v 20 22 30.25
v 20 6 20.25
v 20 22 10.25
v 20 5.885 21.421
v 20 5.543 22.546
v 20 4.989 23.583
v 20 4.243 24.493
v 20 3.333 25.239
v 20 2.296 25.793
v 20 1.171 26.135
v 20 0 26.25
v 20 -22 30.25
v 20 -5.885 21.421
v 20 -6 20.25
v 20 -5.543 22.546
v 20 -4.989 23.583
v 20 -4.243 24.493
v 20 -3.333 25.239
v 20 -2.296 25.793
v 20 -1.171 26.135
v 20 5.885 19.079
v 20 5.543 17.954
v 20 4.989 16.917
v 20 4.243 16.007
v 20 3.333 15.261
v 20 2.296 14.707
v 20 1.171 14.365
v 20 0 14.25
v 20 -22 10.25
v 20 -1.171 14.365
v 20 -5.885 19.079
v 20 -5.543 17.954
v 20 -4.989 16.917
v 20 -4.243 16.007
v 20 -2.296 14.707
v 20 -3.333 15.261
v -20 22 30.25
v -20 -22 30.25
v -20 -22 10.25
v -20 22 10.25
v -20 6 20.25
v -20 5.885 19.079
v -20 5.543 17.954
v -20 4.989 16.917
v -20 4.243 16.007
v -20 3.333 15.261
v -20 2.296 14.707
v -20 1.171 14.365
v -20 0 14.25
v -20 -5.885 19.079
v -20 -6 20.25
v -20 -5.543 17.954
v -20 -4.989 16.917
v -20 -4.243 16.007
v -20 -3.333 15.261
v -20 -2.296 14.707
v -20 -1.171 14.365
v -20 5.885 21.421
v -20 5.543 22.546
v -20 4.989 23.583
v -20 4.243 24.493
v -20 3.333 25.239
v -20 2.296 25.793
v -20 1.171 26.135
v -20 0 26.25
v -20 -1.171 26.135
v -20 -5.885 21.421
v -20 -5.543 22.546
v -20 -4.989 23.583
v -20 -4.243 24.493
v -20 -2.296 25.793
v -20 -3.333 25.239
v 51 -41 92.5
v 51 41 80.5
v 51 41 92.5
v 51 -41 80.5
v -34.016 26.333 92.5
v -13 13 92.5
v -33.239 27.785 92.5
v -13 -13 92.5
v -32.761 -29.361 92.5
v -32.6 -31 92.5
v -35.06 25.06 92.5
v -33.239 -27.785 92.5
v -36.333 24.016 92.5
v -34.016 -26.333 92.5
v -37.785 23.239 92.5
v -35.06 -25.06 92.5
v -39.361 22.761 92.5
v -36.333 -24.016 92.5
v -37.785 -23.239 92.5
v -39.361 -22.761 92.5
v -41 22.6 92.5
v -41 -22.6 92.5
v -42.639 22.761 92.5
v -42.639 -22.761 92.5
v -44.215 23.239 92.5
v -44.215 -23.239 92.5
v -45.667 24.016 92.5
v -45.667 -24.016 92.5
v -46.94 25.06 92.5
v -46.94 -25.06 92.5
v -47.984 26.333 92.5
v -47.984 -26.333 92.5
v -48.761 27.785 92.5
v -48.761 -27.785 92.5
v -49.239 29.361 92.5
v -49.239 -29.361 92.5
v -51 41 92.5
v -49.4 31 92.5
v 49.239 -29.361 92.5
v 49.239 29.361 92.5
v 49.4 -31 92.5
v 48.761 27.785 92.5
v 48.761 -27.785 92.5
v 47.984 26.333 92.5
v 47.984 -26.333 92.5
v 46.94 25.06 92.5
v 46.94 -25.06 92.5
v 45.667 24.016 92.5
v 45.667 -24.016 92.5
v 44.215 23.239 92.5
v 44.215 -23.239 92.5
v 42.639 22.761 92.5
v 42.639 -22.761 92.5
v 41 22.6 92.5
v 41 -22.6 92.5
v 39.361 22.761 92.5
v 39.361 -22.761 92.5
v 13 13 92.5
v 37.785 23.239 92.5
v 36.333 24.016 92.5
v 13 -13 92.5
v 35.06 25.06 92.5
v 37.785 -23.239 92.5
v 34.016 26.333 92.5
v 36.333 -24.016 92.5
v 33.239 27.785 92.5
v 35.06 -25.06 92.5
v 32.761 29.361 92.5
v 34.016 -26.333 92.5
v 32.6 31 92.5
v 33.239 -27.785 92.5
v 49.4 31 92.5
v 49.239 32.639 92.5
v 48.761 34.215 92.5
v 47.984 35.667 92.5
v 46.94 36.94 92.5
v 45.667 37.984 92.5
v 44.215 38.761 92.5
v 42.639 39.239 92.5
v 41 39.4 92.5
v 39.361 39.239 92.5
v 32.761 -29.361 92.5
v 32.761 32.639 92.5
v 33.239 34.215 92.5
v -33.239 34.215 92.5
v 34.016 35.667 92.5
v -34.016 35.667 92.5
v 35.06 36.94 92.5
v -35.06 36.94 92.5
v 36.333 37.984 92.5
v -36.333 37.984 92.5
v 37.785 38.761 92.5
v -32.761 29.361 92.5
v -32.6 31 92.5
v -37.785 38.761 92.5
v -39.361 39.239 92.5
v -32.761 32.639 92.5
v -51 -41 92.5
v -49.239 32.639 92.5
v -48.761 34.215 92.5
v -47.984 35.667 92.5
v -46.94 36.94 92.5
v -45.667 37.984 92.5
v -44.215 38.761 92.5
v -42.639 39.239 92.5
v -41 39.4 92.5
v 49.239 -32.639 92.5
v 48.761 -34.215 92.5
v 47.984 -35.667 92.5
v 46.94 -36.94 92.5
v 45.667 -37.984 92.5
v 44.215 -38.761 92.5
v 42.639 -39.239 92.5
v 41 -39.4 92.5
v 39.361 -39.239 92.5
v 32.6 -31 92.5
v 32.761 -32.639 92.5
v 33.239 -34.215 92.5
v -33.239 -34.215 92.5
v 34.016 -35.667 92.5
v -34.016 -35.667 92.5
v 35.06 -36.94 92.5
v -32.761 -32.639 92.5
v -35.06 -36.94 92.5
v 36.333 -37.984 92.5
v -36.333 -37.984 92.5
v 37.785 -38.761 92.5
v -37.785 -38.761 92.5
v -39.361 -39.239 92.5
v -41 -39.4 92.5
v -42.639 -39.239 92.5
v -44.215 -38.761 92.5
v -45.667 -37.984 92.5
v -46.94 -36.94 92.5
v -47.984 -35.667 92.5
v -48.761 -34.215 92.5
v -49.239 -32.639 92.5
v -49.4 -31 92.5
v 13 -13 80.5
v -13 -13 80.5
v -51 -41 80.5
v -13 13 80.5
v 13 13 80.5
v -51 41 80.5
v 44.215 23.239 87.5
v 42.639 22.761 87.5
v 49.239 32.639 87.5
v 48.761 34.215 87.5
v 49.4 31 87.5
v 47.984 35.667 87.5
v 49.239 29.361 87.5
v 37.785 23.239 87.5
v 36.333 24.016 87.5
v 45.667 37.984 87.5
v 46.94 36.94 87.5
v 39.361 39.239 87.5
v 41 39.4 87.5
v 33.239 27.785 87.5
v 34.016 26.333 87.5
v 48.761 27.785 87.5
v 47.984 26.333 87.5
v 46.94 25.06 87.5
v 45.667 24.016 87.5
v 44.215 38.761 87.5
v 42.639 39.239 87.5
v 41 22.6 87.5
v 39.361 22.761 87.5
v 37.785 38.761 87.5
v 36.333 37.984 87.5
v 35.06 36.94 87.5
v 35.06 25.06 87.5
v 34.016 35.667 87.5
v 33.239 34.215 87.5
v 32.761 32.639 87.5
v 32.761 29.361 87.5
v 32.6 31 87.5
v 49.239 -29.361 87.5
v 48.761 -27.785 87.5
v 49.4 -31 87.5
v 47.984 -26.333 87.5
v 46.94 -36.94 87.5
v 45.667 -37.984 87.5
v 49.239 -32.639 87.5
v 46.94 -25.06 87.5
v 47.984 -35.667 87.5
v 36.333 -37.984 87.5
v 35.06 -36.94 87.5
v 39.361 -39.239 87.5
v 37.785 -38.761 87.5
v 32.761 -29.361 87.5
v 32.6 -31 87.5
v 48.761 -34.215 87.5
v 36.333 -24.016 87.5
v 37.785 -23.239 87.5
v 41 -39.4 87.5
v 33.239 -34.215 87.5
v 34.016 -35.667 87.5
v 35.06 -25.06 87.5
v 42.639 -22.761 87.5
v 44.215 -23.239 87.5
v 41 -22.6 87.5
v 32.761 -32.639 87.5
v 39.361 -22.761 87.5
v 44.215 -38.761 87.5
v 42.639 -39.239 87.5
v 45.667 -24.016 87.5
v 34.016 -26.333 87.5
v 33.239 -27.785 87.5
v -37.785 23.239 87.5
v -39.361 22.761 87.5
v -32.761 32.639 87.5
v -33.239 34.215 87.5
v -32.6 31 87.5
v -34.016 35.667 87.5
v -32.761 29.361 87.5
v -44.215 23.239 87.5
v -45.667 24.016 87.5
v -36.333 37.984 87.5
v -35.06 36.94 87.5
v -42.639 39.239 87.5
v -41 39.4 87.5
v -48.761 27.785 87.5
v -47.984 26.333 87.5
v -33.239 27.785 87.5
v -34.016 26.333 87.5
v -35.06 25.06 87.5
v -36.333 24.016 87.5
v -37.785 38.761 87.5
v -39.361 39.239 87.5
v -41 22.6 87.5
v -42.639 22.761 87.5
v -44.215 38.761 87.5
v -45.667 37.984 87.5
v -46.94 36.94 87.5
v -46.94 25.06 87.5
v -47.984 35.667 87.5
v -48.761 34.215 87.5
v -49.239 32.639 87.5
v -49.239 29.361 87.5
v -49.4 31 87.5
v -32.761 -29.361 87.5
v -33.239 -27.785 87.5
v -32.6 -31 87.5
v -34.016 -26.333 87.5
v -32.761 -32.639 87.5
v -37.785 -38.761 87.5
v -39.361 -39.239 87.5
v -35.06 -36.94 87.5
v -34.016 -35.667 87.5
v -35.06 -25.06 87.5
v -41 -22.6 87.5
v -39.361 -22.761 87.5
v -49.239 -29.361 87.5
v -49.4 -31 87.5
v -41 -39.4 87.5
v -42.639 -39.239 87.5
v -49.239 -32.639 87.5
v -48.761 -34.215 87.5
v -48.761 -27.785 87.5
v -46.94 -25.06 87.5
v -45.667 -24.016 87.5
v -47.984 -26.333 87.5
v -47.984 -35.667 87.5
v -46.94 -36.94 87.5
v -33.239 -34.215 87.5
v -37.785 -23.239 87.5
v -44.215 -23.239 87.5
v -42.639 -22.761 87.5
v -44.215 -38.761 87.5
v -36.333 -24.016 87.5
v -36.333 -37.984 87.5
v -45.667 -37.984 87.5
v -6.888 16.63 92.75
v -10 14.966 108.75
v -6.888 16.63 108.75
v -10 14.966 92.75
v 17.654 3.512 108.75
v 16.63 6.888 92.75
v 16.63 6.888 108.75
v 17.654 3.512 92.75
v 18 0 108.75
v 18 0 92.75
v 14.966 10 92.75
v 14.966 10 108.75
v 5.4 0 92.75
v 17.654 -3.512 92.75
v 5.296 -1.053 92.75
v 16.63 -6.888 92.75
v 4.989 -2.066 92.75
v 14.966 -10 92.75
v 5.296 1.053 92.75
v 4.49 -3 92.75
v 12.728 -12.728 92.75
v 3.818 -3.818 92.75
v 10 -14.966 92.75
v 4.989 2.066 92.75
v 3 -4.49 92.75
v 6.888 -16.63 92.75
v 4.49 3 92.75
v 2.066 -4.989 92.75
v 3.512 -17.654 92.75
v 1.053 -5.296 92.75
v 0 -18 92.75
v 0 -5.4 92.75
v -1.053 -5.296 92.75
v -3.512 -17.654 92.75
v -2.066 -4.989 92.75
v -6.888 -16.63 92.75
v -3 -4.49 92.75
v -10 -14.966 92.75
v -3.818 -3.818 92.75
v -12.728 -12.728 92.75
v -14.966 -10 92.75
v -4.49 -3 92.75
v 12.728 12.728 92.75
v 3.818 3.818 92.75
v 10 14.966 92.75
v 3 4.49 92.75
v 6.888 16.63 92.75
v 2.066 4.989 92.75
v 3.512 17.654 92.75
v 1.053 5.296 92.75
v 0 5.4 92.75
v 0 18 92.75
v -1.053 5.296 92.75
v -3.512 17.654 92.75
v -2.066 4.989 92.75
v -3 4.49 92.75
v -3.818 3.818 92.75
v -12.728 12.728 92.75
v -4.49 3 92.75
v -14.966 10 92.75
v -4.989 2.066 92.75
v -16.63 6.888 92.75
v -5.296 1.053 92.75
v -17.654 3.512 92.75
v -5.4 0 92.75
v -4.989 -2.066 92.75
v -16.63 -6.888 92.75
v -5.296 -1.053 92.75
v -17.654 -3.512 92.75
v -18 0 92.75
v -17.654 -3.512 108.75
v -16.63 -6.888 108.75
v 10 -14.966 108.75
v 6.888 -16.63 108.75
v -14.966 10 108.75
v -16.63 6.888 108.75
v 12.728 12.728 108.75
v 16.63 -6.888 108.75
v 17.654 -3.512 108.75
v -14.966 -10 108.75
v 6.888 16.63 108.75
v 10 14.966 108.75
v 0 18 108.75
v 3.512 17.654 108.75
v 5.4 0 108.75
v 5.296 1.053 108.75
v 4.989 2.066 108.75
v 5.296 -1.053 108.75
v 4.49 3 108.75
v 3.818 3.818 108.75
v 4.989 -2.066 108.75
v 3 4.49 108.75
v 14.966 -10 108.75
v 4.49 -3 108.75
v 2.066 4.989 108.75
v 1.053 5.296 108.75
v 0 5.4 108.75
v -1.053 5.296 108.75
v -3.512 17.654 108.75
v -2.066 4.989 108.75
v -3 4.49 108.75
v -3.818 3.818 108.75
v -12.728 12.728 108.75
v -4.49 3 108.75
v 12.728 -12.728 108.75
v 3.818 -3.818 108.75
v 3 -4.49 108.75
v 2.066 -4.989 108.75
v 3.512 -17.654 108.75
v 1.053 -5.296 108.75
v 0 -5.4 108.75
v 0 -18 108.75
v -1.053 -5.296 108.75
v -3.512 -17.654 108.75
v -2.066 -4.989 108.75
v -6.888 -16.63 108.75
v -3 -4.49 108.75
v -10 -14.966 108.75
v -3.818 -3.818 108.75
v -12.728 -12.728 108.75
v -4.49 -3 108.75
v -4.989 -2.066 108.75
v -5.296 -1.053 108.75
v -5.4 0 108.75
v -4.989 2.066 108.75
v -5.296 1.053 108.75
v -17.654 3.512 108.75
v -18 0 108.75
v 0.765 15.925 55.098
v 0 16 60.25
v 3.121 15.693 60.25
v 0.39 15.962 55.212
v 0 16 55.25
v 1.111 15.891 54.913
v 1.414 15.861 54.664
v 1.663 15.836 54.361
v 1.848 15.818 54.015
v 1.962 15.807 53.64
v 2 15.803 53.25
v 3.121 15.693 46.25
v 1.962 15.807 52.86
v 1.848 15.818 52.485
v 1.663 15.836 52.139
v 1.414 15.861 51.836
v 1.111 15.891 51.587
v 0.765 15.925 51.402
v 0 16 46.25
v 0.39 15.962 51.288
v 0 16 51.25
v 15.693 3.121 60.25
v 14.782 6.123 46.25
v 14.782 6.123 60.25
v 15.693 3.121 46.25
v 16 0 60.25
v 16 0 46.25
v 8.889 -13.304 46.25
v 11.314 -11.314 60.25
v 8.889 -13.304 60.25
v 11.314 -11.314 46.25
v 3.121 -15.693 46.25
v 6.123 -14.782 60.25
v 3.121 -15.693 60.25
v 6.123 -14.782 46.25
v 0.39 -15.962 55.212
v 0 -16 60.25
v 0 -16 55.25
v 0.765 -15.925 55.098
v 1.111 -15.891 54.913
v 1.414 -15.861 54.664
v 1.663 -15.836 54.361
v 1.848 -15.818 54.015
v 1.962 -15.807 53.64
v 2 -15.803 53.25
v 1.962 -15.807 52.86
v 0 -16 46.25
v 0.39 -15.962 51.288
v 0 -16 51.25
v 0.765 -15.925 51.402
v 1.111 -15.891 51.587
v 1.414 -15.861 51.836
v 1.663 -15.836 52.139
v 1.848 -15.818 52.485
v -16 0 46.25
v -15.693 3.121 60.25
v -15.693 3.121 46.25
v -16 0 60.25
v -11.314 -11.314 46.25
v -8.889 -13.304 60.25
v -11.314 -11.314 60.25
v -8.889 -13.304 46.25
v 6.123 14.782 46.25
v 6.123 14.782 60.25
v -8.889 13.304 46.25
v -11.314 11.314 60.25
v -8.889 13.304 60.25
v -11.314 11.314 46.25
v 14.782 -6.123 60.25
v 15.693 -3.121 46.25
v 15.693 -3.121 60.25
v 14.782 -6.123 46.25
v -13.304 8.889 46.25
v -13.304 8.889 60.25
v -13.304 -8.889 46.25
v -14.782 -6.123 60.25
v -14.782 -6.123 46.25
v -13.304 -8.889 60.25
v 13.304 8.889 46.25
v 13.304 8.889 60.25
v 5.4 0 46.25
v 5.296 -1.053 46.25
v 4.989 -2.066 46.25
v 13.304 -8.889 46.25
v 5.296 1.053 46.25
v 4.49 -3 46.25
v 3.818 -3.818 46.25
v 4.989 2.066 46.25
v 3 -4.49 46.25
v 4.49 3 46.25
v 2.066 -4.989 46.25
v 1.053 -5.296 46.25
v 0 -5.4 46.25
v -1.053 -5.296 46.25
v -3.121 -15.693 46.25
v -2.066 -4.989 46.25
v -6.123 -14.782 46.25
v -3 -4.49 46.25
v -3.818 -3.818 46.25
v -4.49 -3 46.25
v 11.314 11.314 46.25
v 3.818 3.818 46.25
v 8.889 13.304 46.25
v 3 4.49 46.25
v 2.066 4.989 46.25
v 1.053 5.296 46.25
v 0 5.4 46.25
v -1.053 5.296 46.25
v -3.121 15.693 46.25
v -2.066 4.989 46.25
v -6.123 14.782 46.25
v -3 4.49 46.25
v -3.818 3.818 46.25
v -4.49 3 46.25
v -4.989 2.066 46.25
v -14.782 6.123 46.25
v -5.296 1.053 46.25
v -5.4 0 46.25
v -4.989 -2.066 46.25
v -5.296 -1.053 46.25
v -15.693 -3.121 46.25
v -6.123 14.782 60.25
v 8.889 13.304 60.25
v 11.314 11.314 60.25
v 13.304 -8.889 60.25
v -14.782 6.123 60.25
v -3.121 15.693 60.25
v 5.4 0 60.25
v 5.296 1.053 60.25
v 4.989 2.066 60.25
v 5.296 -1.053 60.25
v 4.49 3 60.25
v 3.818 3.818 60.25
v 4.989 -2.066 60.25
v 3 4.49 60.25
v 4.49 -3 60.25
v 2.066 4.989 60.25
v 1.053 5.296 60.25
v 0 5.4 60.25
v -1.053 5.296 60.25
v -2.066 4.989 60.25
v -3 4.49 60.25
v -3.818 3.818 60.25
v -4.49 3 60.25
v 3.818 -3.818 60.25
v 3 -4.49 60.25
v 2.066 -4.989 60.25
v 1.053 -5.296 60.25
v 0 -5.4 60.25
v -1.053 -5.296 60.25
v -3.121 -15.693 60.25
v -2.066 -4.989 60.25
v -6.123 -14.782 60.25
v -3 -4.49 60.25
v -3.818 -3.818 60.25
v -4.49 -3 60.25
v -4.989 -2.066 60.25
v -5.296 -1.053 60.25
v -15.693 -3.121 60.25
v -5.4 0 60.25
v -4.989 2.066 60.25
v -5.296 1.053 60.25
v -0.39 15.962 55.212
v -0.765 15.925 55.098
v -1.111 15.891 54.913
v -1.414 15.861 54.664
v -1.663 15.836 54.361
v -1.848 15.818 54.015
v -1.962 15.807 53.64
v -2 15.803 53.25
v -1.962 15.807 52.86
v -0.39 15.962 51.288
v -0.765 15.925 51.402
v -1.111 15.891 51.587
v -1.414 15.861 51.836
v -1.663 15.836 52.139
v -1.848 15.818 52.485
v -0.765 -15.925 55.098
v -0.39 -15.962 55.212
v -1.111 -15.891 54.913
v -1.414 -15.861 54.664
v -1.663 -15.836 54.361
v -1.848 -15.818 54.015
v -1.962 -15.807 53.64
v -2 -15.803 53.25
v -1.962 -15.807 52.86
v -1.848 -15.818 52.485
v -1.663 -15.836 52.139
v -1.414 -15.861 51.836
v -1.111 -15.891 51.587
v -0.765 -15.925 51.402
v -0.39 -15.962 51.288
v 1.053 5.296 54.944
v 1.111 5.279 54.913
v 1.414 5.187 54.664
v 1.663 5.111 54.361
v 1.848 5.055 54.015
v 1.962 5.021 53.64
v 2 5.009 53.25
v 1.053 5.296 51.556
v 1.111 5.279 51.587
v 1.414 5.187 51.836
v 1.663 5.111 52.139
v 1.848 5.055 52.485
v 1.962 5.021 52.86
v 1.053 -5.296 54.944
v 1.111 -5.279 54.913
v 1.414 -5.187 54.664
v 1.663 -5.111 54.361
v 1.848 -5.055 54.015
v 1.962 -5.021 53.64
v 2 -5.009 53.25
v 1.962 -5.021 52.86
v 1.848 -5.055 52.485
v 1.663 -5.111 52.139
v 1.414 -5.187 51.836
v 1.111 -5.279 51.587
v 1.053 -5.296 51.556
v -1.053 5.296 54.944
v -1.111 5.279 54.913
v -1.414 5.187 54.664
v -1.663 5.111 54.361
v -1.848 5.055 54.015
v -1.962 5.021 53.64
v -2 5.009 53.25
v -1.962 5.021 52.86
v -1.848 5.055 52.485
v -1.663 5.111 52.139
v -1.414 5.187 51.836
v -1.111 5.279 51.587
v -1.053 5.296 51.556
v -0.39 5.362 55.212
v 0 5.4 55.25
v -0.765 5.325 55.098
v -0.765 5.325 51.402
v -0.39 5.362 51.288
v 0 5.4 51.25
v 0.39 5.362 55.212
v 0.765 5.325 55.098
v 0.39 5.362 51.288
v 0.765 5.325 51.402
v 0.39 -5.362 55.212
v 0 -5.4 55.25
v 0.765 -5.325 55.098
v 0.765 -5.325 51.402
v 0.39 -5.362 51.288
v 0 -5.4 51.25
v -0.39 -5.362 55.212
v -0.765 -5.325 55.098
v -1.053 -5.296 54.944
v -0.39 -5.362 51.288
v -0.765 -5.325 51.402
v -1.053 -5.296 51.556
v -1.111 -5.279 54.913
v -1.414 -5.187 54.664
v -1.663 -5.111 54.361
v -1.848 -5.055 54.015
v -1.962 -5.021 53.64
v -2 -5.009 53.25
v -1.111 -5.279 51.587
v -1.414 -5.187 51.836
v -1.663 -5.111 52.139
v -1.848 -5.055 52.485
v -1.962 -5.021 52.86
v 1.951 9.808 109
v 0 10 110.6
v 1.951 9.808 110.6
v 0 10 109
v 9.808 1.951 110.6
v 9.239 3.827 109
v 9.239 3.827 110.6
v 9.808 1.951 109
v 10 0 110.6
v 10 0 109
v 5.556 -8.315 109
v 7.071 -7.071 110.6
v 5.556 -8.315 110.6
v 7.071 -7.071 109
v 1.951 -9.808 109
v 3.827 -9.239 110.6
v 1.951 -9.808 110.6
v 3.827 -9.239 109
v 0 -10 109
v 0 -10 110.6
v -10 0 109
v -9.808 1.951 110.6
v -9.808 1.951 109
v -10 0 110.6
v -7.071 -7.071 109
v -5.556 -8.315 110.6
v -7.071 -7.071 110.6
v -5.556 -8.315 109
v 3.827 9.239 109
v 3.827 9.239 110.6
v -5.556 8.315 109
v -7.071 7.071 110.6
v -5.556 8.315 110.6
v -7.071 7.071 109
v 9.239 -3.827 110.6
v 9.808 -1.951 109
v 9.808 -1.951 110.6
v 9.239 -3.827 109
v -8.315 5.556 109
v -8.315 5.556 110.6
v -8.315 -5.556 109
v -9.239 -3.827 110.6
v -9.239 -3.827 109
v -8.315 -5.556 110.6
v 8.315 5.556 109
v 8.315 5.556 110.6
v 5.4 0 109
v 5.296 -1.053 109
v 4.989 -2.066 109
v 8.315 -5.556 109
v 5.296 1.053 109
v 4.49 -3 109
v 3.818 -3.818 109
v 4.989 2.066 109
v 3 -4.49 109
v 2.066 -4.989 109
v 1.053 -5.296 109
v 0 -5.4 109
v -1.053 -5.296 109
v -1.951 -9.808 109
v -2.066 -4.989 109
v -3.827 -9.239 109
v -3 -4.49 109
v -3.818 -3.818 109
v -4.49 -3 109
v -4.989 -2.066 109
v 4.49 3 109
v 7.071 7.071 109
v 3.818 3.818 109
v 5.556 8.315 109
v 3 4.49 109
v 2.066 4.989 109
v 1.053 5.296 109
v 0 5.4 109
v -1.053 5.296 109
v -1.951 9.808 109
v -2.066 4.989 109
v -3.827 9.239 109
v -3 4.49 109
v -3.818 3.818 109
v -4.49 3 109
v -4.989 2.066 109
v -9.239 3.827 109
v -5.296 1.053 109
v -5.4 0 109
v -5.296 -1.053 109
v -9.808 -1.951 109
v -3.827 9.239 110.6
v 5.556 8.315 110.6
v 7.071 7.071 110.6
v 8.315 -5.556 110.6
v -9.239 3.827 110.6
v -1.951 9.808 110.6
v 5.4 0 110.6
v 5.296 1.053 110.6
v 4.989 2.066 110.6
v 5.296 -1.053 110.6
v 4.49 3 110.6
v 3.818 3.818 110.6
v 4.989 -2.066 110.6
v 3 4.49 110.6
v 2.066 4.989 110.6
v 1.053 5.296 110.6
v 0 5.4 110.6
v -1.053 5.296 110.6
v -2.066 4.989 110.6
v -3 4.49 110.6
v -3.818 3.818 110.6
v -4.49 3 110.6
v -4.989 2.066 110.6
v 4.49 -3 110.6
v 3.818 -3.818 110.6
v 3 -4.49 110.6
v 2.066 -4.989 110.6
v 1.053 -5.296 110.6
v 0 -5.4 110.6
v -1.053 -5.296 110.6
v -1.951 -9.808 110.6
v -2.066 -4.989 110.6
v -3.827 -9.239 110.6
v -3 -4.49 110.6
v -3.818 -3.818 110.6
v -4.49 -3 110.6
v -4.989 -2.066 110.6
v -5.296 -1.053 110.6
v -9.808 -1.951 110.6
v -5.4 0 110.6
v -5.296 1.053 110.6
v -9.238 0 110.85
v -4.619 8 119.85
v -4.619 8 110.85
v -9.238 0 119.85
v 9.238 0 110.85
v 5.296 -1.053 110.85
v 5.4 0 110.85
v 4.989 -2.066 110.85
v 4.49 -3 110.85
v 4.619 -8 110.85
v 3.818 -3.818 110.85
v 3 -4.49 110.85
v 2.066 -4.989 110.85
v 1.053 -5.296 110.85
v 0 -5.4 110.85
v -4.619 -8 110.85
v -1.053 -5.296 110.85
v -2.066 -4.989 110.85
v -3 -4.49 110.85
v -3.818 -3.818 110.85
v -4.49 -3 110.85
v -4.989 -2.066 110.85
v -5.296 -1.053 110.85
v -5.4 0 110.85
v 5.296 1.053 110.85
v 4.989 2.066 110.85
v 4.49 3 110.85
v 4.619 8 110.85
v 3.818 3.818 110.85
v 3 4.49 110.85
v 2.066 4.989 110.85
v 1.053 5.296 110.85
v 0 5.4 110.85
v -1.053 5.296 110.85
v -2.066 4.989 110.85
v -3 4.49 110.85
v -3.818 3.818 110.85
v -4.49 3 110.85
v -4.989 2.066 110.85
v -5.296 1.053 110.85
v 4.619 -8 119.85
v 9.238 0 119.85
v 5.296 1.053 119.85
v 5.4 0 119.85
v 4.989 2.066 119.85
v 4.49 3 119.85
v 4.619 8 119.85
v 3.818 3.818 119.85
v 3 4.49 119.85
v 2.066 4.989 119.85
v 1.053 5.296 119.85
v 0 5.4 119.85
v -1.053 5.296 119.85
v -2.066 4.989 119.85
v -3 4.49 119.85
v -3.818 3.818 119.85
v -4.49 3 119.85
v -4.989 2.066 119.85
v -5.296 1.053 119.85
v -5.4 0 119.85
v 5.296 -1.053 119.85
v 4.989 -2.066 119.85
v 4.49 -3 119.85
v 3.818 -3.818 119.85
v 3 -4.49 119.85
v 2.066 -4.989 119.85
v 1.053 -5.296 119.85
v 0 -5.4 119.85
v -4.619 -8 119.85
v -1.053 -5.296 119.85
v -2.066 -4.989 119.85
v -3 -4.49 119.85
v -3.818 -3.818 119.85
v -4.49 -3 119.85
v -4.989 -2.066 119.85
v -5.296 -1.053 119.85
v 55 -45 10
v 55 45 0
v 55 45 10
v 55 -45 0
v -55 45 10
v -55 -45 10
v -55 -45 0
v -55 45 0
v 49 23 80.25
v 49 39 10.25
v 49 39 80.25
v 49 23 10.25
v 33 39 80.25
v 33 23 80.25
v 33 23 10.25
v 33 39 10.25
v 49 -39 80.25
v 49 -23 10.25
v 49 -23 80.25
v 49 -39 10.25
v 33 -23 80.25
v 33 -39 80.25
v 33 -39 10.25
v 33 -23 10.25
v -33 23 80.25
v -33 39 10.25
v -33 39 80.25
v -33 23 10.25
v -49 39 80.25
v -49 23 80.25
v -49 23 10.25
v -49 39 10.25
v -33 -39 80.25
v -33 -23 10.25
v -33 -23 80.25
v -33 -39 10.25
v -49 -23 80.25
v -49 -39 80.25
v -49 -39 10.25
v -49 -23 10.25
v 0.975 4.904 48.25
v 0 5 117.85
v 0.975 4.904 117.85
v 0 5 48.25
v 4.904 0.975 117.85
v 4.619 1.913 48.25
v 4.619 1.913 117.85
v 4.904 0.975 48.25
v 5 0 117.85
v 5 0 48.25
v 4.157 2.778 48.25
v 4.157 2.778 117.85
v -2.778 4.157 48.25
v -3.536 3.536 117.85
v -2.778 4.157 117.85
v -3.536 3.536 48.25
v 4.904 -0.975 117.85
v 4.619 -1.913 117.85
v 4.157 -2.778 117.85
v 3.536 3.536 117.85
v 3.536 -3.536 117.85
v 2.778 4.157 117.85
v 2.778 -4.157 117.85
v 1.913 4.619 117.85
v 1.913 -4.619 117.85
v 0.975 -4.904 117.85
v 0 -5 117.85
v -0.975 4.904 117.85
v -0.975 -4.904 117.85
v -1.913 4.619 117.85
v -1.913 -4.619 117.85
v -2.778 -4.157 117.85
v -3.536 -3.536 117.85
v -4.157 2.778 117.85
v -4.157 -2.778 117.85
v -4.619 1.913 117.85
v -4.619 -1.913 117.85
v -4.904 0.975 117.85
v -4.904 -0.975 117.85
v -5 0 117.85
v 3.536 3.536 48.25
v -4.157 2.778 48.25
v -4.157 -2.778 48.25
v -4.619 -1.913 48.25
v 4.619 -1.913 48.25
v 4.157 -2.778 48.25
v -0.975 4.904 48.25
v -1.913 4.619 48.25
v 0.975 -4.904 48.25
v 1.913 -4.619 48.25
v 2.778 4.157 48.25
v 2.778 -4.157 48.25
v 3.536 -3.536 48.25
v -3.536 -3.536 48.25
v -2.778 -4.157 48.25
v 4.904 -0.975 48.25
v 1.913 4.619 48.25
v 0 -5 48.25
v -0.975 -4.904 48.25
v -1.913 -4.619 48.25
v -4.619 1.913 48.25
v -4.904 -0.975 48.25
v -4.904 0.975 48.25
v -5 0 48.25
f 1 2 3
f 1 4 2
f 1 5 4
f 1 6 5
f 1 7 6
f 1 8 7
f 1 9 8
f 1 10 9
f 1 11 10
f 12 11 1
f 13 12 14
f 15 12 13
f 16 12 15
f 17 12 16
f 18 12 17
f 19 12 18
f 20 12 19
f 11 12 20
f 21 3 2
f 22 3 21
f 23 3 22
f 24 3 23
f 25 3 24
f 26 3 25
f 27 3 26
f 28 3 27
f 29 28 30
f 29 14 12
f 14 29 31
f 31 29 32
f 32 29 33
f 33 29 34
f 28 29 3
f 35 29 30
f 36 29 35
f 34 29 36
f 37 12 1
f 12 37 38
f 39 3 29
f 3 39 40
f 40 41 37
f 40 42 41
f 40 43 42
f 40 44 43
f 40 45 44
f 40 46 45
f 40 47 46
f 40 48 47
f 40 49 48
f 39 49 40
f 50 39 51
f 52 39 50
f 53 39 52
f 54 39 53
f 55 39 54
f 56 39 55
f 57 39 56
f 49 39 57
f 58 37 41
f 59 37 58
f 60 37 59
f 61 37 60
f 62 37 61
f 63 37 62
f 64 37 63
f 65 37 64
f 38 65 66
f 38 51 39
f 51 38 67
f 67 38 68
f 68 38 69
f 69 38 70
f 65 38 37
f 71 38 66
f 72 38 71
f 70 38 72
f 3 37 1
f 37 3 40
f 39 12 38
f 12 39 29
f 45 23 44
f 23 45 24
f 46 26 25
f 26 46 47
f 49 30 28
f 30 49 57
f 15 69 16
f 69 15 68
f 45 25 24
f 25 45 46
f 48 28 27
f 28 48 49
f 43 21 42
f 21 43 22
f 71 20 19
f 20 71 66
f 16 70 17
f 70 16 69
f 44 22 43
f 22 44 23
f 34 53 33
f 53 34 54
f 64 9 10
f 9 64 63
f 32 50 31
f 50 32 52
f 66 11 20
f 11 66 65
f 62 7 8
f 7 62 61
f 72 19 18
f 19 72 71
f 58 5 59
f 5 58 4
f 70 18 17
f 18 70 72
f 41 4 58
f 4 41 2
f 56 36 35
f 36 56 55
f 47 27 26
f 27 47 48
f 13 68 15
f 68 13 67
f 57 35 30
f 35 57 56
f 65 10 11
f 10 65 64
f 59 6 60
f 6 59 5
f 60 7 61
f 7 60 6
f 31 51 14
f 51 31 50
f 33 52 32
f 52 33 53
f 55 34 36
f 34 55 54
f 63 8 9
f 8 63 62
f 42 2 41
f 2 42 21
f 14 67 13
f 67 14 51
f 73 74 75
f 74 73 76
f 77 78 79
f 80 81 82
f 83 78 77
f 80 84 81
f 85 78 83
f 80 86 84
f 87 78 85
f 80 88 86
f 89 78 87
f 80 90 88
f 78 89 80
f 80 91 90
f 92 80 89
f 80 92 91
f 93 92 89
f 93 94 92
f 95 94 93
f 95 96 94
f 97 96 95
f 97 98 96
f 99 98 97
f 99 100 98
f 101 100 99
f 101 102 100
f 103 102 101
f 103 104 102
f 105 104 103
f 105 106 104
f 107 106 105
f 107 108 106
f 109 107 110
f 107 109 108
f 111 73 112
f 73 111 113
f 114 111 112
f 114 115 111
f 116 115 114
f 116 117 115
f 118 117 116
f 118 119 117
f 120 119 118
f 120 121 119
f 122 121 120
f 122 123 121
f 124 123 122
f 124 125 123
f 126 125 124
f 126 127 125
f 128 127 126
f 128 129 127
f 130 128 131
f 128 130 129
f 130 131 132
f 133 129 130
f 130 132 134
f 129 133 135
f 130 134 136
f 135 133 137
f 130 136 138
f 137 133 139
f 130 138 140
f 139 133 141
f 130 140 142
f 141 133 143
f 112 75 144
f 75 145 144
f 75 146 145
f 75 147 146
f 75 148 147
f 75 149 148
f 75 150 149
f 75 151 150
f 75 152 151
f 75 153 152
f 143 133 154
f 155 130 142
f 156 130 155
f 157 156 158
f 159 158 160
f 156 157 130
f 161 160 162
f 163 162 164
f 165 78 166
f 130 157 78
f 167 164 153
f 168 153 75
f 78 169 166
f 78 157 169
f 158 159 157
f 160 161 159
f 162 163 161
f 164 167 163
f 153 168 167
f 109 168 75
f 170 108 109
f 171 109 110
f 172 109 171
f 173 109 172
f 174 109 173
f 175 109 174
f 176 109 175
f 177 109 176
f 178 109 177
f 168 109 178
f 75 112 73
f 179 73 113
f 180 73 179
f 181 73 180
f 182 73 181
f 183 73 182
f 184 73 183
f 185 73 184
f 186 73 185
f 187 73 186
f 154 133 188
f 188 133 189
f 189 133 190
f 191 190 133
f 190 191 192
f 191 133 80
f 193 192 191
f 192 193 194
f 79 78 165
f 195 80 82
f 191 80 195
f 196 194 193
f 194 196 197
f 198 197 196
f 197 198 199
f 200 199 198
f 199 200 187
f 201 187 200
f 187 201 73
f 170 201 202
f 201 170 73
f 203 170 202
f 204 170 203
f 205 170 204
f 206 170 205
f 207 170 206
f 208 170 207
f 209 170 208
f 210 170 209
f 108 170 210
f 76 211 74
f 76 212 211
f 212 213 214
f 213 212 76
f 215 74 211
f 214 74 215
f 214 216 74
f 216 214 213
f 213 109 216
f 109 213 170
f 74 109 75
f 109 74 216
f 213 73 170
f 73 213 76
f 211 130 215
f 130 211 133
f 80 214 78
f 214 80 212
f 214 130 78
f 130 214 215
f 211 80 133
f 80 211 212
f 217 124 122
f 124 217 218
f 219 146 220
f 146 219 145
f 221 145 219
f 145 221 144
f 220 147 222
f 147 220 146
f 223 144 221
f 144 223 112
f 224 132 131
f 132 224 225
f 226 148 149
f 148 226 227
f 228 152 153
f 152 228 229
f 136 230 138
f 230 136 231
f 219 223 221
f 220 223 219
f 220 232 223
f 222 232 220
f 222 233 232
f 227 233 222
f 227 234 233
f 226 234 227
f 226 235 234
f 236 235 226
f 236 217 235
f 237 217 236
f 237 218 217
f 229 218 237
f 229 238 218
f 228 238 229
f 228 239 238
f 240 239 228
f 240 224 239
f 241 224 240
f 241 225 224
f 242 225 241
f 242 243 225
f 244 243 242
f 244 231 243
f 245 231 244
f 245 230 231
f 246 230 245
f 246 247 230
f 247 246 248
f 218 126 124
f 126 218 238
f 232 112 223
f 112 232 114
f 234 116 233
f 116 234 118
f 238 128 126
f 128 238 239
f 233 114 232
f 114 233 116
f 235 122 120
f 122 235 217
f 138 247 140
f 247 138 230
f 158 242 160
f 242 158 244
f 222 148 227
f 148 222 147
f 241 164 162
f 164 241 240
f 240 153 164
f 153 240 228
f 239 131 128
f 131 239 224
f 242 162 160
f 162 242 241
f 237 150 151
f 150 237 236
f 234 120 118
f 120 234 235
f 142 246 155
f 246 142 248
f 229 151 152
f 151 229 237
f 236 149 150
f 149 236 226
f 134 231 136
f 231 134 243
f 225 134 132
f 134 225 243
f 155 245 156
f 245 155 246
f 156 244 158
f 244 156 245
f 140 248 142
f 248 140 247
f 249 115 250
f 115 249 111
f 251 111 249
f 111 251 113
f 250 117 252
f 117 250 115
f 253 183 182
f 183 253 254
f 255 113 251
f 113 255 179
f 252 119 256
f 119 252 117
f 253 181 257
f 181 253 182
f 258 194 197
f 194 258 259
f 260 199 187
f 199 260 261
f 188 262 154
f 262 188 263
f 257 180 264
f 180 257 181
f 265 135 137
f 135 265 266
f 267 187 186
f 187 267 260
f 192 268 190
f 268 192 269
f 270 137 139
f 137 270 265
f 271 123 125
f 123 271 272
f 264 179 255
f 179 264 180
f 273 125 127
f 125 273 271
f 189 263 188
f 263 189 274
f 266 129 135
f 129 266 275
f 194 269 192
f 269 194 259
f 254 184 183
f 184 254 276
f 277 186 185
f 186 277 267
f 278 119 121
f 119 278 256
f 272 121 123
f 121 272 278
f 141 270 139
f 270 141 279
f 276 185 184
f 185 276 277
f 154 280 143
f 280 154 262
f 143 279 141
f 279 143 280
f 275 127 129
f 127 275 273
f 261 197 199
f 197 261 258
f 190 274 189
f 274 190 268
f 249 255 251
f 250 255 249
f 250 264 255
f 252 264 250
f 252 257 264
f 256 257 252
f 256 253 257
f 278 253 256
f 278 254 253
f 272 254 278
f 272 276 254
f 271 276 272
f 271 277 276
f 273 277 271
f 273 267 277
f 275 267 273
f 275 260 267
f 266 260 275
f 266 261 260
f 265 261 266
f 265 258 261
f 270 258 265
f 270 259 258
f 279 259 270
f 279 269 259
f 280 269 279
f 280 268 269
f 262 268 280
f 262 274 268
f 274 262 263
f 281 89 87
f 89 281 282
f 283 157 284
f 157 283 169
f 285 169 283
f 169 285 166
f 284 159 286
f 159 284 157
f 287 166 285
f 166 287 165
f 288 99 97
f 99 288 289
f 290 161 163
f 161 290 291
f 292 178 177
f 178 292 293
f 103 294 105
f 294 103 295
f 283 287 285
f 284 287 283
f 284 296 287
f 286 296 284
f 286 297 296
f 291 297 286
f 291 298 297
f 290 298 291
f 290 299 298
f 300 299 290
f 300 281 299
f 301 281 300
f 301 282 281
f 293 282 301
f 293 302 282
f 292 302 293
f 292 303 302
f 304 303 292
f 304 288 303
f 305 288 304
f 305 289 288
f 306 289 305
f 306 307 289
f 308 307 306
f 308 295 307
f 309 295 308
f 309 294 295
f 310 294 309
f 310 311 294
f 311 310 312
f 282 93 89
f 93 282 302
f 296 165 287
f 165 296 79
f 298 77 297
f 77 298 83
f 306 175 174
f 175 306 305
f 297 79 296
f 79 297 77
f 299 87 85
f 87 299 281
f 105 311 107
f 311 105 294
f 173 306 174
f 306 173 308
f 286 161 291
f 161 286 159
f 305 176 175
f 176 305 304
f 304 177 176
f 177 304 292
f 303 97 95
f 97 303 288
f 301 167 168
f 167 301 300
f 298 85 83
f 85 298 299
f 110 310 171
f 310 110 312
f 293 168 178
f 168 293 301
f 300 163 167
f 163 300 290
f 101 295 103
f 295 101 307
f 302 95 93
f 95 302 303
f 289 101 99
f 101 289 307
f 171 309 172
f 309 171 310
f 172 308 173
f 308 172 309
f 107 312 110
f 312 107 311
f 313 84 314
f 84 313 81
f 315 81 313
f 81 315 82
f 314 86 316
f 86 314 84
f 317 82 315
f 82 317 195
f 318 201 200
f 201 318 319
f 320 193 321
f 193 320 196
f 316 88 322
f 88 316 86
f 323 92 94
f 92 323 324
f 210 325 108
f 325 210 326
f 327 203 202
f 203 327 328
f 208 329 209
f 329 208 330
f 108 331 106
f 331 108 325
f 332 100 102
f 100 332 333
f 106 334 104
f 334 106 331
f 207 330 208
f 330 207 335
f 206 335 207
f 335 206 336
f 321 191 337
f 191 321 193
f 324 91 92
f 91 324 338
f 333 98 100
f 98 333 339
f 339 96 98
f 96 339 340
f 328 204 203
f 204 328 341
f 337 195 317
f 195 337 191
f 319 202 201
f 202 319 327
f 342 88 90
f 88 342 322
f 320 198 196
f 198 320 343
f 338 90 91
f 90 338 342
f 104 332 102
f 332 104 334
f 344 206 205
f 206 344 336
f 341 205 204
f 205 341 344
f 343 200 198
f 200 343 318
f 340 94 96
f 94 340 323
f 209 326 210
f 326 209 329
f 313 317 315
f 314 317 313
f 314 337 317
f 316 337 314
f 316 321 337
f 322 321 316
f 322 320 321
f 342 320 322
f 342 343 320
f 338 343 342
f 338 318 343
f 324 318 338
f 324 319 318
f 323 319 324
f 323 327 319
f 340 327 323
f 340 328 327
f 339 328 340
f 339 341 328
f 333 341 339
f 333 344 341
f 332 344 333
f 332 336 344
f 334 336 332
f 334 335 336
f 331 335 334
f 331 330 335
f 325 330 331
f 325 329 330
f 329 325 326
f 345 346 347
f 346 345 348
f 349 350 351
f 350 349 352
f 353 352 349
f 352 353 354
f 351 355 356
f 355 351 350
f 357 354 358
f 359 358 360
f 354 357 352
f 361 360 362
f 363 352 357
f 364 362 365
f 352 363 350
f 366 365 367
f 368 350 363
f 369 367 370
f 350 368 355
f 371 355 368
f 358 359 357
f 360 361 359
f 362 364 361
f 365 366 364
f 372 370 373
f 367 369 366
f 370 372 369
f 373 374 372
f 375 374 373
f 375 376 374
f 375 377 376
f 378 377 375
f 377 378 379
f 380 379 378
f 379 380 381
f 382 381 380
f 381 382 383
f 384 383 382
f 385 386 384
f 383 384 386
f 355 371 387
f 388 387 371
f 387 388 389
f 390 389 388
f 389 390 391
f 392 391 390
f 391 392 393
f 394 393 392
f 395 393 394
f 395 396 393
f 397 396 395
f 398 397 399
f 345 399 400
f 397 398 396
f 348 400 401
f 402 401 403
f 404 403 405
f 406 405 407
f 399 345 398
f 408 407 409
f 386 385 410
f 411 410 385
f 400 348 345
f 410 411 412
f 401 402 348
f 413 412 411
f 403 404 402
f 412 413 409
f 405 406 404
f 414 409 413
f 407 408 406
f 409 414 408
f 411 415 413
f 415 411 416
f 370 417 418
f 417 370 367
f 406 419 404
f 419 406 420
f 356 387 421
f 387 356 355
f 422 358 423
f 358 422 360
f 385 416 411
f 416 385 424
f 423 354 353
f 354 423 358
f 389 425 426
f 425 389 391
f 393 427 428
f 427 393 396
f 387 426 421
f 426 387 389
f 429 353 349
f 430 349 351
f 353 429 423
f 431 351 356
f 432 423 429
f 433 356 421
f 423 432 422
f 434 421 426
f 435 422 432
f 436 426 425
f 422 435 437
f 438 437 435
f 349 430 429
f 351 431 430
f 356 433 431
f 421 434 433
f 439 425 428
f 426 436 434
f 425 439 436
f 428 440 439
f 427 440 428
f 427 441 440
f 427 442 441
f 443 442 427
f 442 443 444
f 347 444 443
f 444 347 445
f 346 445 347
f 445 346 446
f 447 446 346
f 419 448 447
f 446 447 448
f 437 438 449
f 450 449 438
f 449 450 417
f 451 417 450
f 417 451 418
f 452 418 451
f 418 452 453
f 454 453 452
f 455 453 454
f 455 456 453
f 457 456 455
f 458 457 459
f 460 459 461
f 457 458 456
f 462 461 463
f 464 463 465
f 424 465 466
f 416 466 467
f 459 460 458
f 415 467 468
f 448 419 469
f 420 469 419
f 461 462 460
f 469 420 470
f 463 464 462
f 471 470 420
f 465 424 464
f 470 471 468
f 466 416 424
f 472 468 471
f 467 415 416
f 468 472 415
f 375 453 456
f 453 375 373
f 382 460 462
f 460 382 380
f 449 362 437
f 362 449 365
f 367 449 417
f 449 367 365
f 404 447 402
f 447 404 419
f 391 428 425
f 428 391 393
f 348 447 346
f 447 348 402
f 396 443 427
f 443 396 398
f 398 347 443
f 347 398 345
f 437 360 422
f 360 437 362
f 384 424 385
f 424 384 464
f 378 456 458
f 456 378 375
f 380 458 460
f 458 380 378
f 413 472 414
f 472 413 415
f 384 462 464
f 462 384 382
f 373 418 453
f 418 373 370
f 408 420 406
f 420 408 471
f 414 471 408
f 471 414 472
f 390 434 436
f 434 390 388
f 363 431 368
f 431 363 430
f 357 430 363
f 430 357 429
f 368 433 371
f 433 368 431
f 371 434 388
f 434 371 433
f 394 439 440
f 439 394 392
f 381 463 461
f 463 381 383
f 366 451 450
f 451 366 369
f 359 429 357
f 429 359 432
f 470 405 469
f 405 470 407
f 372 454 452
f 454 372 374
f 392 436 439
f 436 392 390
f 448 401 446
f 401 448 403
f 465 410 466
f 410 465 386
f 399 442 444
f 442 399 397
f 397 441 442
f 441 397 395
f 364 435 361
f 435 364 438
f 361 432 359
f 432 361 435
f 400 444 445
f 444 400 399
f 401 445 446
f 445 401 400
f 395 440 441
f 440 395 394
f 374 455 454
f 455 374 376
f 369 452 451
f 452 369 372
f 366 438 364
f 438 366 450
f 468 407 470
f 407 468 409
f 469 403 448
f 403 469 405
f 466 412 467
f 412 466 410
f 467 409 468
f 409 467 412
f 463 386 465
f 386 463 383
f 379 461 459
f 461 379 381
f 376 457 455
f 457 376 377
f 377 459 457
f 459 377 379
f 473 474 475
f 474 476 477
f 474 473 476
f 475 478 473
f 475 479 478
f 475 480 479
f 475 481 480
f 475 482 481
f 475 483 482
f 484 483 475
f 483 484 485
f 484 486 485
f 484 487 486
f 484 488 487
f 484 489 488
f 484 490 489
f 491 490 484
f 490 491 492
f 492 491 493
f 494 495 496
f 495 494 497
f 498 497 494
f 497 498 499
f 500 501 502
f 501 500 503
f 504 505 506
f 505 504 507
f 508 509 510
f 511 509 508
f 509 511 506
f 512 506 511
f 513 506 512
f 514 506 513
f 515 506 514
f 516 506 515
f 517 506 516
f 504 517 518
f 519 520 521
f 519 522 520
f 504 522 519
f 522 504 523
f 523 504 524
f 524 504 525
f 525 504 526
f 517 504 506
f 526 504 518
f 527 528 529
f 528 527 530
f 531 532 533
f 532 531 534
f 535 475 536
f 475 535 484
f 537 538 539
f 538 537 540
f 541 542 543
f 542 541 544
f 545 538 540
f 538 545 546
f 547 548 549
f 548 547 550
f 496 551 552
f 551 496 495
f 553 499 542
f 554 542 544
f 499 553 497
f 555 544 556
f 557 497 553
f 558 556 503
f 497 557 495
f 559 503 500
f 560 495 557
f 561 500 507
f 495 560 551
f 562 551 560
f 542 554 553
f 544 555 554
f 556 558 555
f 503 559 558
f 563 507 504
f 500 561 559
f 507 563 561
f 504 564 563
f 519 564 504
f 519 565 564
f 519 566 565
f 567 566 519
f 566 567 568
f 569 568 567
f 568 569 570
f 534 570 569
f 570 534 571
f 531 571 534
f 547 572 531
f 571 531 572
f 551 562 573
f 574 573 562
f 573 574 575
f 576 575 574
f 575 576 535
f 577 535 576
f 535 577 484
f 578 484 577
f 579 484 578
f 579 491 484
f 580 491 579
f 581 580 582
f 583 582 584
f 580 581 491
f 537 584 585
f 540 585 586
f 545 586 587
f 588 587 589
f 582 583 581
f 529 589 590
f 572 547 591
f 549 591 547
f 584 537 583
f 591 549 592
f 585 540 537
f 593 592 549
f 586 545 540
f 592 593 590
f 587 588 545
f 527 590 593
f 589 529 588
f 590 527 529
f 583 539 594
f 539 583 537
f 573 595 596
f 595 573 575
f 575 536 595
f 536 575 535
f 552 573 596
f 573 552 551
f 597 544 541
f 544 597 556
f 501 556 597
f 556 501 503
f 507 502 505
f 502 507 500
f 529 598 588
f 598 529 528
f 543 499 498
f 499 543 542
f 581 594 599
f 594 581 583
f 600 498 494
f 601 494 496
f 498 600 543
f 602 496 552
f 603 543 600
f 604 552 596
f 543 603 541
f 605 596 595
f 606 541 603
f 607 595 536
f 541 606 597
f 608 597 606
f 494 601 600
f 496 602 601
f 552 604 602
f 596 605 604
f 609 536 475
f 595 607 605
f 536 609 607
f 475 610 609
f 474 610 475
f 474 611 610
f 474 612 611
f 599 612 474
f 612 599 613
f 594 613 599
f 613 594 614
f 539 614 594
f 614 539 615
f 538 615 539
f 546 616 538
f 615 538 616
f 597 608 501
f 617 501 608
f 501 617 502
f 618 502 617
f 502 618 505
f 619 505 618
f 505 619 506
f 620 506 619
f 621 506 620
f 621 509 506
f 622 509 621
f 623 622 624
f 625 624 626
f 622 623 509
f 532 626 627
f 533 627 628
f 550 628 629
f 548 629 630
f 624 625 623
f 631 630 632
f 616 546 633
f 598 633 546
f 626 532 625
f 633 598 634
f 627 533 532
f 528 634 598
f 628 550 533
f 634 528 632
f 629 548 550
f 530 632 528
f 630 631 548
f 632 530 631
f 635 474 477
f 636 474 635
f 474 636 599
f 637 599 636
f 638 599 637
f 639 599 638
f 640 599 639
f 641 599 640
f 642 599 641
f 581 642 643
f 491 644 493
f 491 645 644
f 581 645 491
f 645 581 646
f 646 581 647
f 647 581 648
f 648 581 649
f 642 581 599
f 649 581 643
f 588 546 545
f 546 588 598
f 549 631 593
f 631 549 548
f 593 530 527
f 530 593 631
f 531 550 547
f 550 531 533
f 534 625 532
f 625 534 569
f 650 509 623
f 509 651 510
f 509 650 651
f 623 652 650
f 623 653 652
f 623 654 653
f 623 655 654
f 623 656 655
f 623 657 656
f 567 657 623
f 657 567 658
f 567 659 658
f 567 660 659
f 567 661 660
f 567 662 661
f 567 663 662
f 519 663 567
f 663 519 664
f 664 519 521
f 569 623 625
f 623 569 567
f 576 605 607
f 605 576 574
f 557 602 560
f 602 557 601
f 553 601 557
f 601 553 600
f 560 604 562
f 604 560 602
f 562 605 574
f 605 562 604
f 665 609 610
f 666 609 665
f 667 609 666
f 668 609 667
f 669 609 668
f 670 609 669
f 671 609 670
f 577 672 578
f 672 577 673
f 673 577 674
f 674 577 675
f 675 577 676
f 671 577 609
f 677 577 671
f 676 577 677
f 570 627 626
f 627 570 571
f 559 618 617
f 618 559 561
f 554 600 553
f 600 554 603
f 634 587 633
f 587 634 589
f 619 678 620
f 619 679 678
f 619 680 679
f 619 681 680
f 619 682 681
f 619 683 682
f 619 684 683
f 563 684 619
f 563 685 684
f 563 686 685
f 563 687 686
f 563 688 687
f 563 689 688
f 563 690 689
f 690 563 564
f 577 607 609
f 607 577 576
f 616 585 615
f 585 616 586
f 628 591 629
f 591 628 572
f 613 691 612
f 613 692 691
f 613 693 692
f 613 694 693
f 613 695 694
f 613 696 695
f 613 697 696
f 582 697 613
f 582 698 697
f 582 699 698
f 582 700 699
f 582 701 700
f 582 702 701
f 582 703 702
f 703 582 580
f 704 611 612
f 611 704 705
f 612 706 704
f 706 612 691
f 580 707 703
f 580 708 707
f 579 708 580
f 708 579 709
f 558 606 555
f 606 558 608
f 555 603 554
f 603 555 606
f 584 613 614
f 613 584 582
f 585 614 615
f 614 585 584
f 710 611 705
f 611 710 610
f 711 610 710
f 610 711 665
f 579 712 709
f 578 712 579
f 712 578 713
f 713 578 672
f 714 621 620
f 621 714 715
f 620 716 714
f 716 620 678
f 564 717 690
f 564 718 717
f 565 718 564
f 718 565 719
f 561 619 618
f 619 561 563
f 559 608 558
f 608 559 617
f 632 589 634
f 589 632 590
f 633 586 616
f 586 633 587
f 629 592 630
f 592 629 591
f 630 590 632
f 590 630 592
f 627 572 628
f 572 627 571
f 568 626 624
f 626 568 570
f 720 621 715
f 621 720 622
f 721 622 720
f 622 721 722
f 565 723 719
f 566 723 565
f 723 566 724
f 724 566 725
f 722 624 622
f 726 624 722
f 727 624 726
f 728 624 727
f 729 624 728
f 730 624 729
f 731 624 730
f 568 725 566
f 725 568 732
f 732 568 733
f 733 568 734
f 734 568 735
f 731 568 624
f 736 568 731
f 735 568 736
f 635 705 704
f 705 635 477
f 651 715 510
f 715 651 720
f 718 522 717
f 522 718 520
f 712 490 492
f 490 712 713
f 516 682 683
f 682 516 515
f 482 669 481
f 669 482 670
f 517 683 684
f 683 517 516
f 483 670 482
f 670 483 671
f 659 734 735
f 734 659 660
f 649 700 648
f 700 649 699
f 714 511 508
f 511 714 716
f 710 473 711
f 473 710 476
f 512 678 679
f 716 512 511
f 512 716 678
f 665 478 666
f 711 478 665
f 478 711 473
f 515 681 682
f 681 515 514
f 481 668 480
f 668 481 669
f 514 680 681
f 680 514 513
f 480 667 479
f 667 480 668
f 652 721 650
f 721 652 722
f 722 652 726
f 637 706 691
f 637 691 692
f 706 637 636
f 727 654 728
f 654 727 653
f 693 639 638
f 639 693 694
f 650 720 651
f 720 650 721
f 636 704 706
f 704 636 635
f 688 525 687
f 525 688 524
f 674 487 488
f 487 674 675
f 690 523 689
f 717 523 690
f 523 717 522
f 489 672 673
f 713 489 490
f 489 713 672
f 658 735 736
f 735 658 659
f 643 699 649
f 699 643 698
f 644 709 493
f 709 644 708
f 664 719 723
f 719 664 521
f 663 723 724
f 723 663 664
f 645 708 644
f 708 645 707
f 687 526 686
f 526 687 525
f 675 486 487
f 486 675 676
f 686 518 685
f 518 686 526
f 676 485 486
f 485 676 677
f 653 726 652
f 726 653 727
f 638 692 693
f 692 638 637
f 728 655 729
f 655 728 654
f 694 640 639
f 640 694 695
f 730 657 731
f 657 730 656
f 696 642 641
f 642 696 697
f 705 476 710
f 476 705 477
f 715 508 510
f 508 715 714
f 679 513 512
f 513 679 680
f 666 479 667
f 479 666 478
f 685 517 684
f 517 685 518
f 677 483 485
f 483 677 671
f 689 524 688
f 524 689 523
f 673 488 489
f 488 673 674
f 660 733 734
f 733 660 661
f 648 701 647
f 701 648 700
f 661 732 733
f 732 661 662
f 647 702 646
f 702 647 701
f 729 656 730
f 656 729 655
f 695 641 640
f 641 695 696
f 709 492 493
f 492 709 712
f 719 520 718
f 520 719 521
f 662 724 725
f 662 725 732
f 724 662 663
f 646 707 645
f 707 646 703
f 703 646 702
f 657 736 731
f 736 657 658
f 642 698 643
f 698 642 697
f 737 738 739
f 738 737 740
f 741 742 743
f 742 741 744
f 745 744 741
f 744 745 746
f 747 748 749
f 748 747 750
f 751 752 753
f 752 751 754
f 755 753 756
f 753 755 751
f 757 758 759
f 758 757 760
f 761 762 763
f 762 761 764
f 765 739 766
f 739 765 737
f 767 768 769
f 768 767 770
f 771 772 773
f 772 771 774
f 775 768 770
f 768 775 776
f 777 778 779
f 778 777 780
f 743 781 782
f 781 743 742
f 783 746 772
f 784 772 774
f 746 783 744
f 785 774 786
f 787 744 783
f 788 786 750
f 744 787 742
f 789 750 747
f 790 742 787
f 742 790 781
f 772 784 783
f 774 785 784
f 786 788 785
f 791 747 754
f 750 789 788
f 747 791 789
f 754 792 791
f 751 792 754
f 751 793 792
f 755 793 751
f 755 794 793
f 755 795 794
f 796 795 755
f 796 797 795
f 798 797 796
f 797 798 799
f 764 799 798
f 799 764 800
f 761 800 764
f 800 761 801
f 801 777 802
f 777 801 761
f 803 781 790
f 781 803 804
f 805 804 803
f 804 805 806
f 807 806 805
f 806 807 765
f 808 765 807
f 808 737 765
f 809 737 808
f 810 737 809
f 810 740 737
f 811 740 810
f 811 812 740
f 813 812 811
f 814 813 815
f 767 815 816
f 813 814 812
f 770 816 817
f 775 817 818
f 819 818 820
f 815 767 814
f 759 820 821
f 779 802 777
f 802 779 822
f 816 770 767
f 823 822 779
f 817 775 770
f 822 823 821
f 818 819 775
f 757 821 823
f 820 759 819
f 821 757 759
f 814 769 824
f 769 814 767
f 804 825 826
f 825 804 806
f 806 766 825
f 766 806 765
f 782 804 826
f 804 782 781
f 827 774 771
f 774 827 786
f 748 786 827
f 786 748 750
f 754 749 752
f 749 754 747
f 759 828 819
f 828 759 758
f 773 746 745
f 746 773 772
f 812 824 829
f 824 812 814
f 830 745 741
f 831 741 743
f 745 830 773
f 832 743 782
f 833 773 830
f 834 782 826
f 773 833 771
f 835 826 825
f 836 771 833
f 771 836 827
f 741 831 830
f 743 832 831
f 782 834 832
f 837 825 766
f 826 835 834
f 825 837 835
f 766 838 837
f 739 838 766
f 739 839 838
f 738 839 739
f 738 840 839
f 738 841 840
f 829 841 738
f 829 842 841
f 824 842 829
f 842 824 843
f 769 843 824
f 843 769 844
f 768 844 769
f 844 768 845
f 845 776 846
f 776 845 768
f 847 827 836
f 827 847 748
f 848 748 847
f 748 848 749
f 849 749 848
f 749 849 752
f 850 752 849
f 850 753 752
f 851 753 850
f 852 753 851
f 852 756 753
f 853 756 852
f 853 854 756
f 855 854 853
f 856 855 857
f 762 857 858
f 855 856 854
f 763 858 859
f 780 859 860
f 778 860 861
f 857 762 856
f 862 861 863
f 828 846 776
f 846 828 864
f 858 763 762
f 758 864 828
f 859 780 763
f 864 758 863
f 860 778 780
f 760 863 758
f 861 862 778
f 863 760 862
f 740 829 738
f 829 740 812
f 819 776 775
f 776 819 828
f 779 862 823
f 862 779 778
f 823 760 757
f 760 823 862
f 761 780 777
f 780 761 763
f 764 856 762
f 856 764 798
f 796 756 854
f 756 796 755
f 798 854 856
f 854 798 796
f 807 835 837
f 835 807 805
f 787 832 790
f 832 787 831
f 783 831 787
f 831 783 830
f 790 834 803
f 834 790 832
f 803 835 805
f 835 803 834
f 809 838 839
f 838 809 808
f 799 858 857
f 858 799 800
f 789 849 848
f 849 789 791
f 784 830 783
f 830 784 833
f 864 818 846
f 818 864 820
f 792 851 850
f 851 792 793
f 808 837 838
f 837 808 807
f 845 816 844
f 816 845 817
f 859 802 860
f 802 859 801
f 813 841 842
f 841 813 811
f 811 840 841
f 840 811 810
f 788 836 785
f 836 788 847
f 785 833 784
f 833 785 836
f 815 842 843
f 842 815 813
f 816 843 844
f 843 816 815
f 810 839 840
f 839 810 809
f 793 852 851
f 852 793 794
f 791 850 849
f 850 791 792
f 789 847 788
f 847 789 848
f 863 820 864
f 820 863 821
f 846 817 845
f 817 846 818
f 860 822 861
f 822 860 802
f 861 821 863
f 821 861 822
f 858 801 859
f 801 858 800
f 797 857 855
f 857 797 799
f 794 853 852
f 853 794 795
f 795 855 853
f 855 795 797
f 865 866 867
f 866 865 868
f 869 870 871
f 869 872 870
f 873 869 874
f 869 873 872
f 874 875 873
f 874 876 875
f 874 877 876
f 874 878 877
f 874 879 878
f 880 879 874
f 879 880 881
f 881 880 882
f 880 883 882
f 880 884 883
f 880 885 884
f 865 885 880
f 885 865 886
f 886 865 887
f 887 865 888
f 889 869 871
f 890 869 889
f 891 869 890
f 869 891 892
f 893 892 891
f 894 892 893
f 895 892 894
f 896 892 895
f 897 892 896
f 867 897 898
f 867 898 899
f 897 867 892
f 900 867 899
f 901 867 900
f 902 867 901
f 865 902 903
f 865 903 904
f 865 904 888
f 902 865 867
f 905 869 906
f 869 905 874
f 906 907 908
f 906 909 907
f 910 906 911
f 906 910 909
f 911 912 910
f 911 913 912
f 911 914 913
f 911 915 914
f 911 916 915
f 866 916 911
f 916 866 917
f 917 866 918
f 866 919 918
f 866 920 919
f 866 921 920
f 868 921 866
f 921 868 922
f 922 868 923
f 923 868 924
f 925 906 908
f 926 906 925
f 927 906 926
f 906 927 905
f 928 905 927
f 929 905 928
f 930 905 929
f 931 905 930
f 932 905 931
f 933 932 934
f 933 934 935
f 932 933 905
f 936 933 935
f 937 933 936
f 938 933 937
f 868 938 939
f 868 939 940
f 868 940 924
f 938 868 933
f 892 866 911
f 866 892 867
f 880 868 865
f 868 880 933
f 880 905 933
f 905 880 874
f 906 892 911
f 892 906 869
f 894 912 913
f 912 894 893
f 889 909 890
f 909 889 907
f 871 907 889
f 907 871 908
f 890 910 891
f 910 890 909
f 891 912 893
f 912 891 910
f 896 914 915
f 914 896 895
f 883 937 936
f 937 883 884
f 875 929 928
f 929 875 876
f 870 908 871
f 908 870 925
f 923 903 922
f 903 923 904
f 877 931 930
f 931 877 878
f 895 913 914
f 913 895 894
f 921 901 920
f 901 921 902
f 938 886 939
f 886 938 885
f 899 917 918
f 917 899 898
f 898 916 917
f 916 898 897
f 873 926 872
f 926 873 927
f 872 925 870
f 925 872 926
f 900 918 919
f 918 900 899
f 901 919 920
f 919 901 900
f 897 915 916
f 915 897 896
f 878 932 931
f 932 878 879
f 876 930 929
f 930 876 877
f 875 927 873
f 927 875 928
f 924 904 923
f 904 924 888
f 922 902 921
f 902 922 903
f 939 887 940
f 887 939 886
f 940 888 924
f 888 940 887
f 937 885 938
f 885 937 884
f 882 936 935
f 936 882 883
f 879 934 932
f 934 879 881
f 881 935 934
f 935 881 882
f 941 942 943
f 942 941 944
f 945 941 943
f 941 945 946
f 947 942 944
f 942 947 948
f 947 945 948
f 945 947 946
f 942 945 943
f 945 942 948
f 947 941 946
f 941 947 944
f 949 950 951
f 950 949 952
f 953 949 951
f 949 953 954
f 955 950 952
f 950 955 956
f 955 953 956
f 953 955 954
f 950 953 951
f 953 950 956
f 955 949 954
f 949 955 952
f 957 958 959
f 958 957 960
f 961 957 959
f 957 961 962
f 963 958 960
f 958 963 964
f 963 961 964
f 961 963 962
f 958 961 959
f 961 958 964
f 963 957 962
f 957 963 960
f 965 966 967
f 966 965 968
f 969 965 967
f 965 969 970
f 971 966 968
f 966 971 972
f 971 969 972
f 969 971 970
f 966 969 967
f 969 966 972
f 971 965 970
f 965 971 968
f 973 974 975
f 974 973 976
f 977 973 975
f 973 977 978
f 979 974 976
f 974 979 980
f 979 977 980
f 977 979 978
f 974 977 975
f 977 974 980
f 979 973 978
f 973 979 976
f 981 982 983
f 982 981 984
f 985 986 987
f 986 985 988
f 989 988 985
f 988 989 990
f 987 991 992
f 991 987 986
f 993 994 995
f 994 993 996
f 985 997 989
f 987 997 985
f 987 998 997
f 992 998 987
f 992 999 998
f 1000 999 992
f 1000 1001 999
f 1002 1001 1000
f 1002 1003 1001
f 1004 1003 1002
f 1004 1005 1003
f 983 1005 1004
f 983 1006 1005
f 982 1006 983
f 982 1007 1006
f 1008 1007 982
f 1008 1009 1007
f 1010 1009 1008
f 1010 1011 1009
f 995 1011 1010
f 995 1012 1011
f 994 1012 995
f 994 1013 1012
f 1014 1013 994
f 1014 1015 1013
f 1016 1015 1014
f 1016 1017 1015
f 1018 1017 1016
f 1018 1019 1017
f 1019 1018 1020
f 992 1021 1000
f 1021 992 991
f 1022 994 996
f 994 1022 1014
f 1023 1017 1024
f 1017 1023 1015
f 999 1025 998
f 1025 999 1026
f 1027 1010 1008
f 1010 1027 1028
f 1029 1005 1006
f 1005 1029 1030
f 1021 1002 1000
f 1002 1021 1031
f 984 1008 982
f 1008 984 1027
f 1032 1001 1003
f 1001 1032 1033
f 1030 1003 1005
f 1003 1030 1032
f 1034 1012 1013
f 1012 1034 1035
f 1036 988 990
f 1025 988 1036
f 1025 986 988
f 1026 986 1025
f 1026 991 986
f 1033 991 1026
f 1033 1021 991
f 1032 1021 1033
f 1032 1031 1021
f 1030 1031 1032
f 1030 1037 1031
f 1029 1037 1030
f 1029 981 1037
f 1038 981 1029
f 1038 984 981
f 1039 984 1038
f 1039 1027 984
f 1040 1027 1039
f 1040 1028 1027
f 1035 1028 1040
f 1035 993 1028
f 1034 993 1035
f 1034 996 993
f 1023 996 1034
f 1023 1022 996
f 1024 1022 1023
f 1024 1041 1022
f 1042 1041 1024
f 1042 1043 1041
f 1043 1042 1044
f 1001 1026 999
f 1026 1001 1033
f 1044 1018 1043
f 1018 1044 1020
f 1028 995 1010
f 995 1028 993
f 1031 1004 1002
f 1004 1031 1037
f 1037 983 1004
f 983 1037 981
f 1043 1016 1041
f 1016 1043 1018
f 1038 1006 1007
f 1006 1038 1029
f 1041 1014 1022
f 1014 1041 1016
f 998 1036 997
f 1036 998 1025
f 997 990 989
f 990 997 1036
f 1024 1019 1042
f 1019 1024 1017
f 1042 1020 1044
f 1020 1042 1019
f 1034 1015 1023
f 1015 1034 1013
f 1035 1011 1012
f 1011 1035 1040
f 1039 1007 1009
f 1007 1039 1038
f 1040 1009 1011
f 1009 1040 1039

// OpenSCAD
$fn = 32;

// ------------------------------------------------------------------------
// Arbor press fixture: screw d10, posts 70 mm, gap 16 mm
// Every part is its own module, assembly() places every instance.
// ------------------------------------------------------------------------

// --- part 1 ---
module press_bed() {
  difference() {
    translate([-55, -45, 0]) cube([110, 90, 10]);
  }
}

// --- part 2 ---
module anvil_block() {
  difference() {
    translate([-20, -22, 0]) cube([40, 44, 20]);
    translate([0, 0, 10]) rotate([0, 90, 0]) cylinder(h = 42, d = 12, center = true);
  }
}

// --- part 3 ---
module press_post_a() {
  translate([-8, -8, 0]) cube([16, 16, 70]);
}

// --- part 4 ---
module press_post_b() {
  translate([-8, -8, 0]) cube([16, 16, 70]);
}

// --- part 5 ---
module press_post_c() {
  translate([-8, -8, 0]) cube([16, 16, 70]);
}

// --- part 6 ---
module press_post_d() {
  translate([-8, -8, 0]) cube([16, 16, 70]);
}

// --- part 7 ---
module press_frame() {
  difference() {
    translate([-51, -41, 0]) cube([102, 82, 12]);
    translate([-13, -13, -1]) cube([26, 26, 14]);
    translate([41, 31, 7]) cylinder(h = 6, d = 16.8);
    translate([41, -31, 7]) cylinder(h = 6, d = 16.8);
    translate([-41, 31, 7]) cylinder(h = 6, d = 16.8);
    translate([-41, -31, 7]) cylinder(h = 6, d = 16.8);
  }
}

// --- part 8 ---
module guide_ring() {
  difference() {
      translate([0, 0, 0]) cylinder(h = 16, d = 36);
      translate([0, 0, -1]) cylinder(h = 18, d = 10.8);
    }
}

// --- part 9 ---
module press_screw() {
  translate([0, 0, -34.8]) cylinder(h = 69.6, d = 10);
}

// --- part 10 ---
module press_head() {
  difference() {
    cylinder(h = 14, d = 32);
    translate([0, 0, -1]) cylinder(h = 16, d = 10.8);
    translate([0, 0, 7]) rotate([90, 0, 0]) cylinder(h = 34, d = 4, center = true);
  }
}

// --- part 11 ---
module nut_washer() {
  difference() {
      translate([0, 0, 0]) cylinder(h = 1.6, d = 20);
      translate([0, 0, -1]) cylinder(h = 3.6, d = 10.8);
    }
}

// --- part 12 ---
module press_nut() {
  difference() {
    linear_extrude(height = 9) polygon(points = [[9.238, 0], [4.619, 8], [-4.619, 8], [-9.238, 0], [-4.619, -8], [4.619, -8]]);
    translate([0, 0, -1]) cylinder(h = 11, d = 10.8);
  }
}

// --- assembly ---
module assembly() {
  color([0.80, 0.24, 0.20]) translate([0, 0, 0]) rotate([0, 0, 0]) press_bed();
  color([0.20, 0.45, 0.75]) translate([0, 0, 10.25]) rotate([0, 0, 0]) anvil_block();
  color([0.25, 0.62, 0.32]) translate([41, 31, 10.25]) rotate([0, 0, 0]) press_post_a();
  color([0.92, 0.70, 0.18]) translate([41, -31, 10.25]) rotate([0, 0, 0]) press_post_b();
  color([0.58, 0.35, 0.70]) translate([-41, 31, 10.25]) rotate([0, 0, 0]) press_post_c();
  color([0.16, 0.66, 0.66]) translate([-41, -31, 10.25]) rotate([0, 0, 0]) press_post_d();
  color([0.85, 0.48, 0.18]) translate([0, 0, 80.5]) rotate([0, 0, 0]) press_frame();
  color([0.55, 0.60, 0.65]) translate([0, 0, 92.75]) rotate([0, 0, 0]) guide_ring();
  color([0.75, 0.30, 0.55]) translate([0, 0, 83.05]) rotate([0, 0, 0]) press_screw();
  color([0.42, 0.52, 0.28]) translate([0, 0, 46.25]) rotate([0, 0, 0]) press_head();
  color([0.80, 0.24, 0.20]) translate([0, 0, 109]) rotate([0, 0, 0]) nut_washer();
  color([0.20, 0.45, 0.75]) translate([0, 0, 110.85]) rotate([0, 0, 0]) press_nut();
}

assembly();
